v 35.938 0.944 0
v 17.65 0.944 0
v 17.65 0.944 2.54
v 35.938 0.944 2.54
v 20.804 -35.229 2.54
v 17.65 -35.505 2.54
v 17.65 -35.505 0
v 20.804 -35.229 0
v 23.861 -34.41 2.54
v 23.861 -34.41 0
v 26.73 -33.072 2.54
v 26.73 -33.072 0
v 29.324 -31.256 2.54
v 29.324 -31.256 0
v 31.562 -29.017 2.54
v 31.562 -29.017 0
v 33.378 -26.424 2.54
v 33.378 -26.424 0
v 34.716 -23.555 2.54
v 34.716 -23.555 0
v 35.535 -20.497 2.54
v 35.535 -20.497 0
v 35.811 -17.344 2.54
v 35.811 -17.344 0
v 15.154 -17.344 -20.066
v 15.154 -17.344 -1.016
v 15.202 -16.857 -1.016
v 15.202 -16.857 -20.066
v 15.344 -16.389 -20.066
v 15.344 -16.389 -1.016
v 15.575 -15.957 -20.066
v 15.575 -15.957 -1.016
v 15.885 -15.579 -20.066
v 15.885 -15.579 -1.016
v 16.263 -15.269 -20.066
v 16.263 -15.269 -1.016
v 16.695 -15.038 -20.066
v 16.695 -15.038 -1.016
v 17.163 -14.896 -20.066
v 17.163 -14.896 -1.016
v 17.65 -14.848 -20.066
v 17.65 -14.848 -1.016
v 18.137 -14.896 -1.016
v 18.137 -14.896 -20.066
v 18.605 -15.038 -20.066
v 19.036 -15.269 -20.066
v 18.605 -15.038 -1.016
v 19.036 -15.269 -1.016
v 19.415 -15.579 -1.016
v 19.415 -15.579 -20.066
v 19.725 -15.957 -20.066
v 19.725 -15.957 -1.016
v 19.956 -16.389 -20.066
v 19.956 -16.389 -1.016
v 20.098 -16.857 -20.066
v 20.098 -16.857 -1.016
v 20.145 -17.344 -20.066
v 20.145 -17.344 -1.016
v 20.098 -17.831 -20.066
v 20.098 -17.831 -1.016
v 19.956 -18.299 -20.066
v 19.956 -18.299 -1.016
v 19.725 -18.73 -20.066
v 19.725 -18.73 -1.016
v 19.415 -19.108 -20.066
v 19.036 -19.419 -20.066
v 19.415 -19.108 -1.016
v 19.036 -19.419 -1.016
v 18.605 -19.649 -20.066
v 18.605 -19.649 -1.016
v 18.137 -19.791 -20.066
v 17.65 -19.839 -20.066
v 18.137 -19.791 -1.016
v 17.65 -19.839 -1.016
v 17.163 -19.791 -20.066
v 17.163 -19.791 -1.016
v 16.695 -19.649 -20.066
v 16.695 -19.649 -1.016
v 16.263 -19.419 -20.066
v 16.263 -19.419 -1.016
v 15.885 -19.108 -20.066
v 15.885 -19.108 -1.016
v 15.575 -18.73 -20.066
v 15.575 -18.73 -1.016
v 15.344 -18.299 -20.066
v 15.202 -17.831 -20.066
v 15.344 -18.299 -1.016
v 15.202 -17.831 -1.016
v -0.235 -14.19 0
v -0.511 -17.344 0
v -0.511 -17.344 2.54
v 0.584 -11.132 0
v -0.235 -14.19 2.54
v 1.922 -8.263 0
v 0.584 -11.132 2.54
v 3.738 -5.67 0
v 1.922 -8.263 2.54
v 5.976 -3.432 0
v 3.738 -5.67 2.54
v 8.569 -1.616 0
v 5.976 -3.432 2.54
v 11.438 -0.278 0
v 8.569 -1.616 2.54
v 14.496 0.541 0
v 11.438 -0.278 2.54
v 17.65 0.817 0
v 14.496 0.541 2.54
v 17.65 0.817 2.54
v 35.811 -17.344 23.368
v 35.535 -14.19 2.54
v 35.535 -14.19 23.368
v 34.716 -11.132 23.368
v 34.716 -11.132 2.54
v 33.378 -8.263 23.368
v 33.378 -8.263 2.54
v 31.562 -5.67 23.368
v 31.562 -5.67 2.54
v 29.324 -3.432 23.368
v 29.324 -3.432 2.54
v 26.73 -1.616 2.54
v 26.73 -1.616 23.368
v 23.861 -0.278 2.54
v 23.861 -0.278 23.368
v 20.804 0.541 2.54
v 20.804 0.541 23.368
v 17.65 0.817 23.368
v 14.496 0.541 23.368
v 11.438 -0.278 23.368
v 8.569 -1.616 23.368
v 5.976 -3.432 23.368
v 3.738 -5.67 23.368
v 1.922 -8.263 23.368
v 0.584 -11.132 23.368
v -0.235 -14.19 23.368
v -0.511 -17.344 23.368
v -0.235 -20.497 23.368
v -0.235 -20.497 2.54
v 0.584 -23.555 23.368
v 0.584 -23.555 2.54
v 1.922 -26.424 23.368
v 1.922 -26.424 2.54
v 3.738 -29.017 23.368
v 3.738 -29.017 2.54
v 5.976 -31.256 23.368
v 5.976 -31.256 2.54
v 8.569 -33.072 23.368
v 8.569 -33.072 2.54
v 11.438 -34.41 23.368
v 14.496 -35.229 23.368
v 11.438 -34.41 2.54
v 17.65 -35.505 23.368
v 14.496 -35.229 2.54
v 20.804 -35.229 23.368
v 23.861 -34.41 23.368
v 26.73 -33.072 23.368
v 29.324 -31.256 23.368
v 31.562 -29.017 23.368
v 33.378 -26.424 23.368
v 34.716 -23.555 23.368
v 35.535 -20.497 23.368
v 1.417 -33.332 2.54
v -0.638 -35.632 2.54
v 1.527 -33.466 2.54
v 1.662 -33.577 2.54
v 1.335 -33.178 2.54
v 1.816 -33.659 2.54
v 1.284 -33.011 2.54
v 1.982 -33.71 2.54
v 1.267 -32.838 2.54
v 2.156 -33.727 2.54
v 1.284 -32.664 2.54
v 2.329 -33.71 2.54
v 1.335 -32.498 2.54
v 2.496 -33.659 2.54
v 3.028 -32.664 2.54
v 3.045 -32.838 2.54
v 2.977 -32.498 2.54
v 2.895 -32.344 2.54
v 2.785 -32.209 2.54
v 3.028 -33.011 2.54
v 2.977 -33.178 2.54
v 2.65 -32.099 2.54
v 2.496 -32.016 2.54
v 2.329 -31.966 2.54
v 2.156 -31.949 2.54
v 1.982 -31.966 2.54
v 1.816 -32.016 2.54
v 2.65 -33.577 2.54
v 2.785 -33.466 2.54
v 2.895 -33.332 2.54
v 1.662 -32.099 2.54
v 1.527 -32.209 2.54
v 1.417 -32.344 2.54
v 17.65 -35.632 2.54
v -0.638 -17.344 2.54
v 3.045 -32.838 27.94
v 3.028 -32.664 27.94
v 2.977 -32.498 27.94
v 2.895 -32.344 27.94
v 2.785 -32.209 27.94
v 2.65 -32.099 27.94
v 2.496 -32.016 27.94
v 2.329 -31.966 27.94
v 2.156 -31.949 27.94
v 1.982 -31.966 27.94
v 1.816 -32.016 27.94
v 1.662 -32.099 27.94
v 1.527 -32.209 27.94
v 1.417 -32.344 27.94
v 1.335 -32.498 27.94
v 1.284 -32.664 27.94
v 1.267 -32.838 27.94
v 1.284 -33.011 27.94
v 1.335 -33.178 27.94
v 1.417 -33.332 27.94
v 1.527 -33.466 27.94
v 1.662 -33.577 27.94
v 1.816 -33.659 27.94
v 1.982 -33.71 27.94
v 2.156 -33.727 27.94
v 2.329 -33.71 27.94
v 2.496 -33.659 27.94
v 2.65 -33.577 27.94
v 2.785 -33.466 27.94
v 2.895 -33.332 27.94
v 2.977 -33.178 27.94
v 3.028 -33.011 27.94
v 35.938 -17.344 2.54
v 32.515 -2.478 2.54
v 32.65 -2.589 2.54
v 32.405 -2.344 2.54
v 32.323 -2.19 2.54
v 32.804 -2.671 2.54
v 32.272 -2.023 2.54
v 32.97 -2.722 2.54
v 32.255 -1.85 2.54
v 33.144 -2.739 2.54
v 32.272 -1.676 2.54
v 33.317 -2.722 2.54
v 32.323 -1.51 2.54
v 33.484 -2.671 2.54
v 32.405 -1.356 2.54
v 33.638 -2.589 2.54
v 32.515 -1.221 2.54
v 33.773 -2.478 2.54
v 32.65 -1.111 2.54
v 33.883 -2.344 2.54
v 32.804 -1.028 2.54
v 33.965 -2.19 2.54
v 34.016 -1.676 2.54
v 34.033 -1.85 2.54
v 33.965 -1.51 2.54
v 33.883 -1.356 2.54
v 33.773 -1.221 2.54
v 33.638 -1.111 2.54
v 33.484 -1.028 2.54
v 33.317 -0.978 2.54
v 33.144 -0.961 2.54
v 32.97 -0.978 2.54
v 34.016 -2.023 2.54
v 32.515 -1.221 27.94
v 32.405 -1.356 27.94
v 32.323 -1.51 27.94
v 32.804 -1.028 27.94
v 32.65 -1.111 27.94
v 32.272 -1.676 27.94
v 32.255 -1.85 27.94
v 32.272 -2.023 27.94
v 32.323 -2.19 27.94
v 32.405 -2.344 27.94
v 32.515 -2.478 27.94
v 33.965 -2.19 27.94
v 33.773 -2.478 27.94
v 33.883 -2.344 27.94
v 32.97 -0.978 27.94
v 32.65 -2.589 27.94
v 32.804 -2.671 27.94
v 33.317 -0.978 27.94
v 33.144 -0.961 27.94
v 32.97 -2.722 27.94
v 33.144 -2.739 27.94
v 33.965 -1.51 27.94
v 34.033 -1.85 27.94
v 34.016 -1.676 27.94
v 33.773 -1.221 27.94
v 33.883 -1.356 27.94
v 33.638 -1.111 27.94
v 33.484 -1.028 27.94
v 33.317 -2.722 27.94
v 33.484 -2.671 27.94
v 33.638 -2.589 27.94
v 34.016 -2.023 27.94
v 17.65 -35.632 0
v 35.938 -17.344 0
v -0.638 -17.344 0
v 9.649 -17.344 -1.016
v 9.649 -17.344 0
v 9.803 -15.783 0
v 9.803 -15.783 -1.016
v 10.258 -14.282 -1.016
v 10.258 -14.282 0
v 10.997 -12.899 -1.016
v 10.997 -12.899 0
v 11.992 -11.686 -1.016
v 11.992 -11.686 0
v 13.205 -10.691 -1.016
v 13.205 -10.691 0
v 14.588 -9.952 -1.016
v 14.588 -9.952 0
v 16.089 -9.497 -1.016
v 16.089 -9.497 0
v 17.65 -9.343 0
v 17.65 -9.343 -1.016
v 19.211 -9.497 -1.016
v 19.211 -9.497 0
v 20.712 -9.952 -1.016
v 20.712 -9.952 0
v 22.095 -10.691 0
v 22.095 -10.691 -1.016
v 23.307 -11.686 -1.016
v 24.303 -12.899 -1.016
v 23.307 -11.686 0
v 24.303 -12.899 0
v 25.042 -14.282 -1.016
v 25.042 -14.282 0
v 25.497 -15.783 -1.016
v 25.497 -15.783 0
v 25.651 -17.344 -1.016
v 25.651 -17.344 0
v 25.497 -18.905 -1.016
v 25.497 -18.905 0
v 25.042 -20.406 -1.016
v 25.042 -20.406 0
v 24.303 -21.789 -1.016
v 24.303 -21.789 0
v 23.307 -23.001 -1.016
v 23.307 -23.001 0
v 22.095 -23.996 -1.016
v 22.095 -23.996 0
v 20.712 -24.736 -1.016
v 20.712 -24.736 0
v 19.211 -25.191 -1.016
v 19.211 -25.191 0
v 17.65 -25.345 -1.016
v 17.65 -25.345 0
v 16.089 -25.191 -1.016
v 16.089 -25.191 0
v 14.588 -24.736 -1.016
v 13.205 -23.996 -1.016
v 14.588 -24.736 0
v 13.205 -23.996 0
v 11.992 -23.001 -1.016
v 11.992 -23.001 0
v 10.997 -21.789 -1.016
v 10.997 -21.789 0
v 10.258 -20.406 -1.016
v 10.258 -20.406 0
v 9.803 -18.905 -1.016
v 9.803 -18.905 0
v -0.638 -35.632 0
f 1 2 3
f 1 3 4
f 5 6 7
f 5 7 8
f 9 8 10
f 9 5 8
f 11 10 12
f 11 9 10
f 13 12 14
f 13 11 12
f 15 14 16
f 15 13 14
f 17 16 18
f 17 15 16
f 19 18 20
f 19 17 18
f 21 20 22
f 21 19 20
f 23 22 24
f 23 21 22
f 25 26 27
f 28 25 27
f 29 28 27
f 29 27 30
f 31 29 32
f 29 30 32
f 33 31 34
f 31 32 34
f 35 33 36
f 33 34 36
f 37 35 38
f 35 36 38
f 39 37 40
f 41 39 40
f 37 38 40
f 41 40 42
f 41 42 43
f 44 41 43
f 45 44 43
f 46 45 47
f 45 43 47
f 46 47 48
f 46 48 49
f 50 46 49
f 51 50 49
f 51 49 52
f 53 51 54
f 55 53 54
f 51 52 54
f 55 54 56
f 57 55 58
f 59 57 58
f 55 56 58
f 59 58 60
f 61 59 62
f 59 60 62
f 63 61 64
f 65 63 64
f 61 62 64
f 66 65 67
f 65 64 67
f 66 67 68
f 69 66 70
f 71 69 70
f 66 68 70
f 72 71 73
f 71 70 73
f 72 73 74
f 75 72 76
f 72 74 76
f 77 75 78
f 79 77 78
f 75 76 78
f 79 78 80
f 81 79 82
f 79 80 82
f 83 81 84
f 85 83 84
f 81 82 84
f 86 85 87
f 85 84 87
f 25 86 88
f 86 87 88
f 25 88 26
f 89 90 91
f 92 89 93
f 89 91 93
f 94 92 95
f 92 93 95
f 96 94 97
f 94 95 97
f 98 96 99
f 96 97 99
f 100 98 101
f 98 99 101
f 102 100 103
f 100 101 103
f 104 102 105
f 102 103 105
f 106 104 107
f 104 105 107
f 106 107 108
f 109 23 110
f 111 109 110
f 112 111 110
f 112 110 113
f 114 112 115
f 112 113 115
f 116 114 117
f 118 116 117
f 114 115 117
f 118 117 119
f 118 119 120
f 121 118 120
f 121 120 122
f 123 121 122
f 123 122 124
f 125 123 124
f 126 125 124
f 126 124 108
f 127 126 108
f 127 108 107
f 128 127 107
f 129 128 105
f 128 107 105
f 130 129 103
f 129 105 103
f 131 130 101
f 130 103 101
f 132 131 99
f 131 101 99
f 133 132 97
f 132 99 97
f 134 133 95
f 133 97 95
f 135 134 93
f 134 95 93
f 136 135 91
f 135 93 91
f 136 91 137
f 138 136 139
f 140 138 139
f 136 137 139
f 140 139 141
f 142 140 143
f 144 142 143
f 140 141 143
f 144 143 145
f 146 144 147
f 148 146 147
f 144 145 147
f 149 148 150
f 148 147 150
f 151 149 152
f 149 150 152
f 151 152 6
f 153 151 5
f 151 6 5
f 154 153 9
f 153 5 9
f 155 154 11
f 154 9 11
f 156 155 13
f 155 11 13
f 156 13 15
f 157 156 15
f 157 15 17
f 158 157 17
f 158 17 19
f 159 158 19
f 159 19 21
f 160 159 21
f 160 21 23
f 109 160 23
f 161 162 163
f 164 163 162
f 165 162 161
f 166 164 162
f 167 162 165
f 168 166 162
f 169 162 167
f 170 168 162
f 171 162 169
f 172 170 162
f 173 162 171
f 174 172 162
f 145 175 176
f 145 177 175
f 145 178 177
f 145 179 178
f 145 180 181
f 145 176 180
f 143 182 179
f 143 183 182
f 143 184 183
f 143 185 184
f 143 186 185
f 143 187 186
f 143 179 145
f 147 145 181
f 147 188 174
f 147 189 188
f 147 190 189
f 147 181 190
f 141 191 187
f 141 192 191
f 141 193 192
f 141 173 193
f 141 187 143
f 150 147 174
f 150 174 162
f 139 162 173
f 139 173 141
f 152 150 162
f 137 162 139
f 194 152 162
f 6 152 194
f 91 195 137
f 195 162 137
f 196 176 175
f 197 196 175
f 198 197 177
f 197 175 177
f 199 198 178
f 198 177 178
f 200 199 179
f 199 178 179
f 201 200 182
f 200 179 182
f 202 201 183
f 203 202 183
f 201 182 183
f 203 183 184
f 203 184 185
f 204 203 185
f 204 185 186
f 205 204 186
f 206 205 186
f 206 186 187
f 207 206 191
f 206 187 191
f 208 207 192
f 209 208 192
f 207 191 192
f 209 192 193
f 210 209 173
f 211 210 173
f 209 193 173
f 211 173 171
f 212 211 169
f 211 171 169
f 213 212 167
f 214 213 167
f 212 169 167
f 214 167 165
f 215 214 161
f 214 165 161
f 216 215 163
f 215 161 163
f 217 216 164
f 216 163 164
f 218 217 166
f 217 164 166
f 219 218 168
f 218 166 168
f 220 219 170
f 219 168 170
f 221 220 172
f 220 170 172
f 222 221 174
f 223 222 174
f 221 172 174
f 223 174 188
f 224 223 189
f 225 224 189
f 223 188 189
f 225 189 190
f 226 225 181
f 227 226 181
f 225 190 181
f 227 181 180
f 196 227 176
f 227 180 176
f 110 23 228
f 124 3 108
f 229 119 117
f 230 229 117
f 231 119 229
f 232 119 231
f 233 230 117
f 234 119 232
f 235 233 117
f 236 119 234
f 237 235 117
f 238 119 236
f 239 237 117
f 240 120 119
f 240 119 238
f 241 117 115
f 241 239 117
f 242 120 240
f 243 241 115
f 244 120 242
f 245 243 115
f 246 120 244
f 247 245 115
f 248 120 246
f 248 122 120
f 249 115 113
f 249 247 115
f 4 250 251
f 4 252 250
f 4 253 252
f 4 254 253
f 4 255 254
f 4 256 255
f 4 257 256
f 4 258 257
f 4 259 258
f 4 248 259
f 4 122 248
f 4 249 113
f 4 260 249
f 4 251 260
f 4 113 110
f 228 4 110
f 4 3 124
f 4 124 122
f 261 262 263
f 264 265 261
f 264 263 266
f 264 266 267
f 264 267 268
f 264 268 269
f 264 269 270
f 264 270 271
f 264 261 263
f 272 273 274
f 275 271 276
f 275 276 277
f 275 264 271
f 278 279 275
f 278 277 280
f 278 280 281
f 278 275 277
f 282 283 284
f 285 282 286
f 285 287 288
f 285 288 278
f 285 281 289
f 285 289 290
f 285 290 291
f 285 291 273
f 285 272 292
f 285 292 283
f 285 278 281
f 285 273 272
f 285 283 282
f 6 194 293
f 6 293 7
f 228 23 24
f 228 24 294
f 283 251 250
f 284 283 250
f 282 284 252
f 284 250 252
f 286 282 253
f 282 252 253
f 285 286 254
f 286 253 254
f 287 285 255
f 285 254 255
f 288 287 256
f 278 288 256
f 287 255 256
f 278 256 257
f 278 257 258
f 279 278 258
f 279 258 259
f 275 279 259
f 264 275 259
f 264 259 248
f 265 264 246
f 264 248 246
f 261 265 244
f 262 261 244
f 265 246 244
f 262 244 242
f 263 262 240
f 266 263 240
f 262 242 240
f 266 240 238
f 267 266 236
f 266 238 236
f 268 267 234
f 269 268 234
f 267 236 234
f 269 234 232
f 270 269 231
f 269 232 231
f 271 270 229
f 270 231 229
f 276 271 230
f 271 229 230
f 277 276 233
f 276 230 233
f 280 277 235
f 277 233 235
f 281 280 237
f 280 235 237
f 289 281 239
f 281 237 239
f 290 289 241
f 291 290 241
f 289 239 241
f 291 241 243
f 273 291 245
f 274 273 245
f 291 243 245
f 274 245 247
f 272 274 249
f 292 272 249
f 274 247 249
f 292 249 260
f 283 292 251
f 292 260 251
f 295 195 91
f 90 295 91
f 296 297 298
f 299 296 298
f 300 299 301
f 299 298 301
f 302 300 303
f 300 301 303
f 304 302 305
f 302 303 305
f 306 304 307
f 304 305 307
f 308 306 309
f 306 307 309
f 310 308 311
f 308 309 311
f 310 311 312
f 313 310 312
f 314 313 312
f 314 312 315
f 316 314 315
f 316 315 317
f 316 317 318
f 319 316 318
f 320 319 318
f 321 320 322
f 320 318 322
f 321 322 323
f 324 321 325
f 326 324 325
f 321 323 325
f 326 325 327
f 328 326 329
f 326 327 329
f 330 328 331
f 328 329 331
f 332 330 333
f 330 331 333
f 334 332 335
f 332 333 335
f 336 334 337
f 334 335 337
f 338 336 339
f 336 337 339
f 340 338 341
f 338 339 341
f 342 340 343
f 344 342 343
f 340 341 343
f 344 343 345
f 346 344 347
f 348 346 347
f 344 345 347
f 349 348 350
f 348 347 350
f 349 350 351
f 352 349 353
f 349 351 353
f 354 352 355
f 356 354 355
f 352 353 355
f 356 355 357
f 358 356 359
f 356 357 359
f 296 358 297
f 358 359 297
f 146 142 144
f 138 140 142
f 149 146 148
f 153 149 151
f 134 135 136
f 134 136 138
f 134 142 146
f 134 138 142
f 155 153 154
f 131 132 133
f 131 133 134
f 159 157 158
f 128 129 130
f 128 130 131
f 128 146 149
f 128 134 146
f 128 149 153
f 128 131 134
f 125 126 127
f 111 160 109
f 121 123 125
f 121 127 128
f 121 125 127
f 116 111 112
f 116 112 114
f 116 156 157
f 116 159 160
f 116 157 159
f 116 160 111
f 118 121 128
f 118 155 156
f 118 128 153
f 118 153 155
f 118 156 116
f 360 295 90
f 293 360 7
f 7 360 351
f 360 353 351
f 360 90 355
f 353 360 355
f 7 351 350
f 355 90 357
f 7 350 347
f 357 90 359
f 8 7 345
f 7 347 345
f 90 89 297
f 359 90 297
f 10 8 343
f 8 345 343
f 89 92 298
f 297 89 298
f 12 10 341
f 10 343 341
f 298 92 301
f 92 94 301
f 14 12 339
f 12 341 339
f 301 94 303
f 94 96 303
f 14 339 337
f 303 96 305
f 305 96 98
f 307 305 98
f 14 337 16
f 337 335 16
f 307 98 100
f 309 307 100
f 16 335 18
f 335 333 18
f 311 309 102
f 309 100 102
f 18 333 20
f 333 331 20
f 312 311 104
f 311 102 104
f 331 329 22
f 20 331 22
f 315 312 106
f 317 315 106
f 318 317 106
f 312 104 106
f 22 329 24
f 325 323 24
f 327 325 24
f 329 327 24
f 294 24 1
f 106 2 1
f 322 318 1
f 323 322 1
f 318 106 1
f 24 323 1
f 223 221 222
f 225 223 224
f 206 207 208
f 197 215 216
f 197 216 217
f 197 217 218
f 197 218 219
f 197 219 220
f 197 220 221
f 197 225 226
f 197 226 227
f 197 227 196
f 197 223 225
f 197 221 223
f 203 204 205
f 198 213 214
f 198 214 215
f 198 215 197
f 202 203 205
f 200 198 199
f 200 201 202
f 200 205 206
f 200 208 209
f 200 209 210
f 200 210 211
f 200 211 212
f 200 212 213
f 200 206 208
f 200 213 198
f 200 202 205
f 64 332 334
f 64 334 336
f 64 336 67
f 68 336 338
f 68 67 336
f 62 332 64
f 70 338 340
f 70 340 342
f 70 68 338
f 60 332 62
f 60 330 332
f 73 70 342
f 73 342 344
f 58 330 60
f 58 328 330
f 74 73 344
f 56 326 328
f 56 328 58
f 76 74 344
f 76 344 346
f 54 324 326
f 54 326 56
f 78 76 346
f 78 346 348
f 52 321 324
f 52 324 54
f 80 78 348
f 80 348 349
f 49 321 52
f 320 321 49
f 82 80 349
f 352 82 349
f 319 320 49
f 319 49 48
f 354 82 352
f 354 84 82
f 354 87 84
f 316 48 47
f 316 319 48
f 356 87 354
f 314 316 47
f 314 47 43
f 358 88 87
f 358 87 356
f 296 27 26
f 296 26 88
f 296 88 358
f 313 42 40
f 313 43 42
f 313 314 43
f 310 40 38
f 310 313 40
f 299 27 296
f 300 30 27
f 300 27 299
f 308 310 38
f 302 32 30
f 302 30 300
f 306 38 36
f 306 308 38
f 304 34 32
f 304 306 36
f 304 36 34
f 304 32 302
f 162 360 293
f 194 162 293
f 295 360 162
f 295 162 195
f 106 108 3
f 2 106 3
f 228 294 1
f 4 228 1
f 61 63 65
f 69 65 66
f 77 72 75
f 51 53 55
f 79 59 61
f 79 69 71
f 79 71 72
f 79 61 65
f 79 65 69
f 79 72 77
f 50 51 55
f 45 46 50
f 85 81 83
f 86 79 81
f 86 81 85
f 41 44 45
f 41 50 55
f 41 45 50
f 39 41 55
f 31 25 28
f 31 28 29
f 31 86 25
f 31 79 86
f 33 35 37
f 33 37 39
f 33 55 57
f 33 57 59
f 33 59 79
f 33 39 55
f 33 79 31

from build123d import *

# Parameters (mm, degrees)
SKETCH1_W           = 36.576
SKETCH1_H           = 36.576
BOSS_EXTRUDE1_DEPTH = 2.54
SKETCH2_R           = 0.889
BOSS_EXTRUDE2_DEPTH = 25.4
CUT_EXTRUDE4_DEPTH  = 3.54
SKETCH4_R           = 8.001
BOSS_EXTRUDE3_DEPTH = 1.016
SKETCH5_R           = 2.49555
BOSS_EXTRUDE4_DEPTH = 19.05
SKETCH6_R           = 18.161
BOSS_EXTRUDE5_DEPTH = 20.828


with BuildPart() as part:
    # Sketch1 → Boss-Extrude1 (new body)
    with BuildSketch(Plane.XY):
        with Locations((17.649916168, -17.343808383)):
            Rectangle(SKETCH1_W, SKETCH1_H)
    extrude(amount=BOSS_EXTRUDE1_DEPTH)

    # Sketch2 → Boss-Extrude2 (add)
    with BuildSketch(Plane.XY.offset(2.54)):
        with Locations((33.143916168, -1.849808383)):
            Circle(SKETCH2_R)
        with Locations((2.155916168, -32.837808383)):
            Circle(SKETCH2_R)
    extrude(amount=BOSS_EXTRUDE2_DEPTH)

    # Sketch3 → Cut-Extrude4 (cut, through all)
    with BuildSketch(Plane.XY.offset(2.54)):
        with BuildLine():
            Line((-0.638083832, 0.944191617), (-0.638083832, -17.343808383))
            Line((-0.638083832, -17.343808383), (-0.511083832, -17.343808383))
            ThreePointArc((-0.511083832, -17.343808383), (4.808149915, -4.50204213), (17.649916168, 0.817191617))
            Line((17.649916168, 0.817191617), (17.649916168, 0.944191617))
            Line((17.649916168, 0.944191617), (-0.638083832, 0.944191617))
        make_face()
        with BuildLine():
            Line((35.937916168, -35.631808383), (17.649916168, -35.631808383))
            Line((17.649916168, -35.631808383), (17.649916168, -35.504808383))
            ThreePointArc((17.649916168, -35.504808383), (30.491682421, -30.185574636), (35.810916168, -17.343808383))
            Line((35.810916168, -17.343808383), (35.937916168, -17.343808383))
            Line((35.937916168, -17.343808383), (35.937916168, -35.631808383))
        make_face()
    extrude(amount=-CUT_EXTRUDE4_DEPTH, mode=Mode.SUBTRACT)

    # Sketch4 → Boss-Extrude3 (add)
    with BuildSketch(Plane(origin=(0, 0, 0), x_dir=(-1, 0, 0), z_dir=(0, 0, -1))):
        with Locations((-17.649916168, -17.343808383)):
            Circle(SKETCH4_R)
    extrude(amount=BOSS_EXTRUDE3_DEPTH)

    # Sketch5 → Boss-Extrude4 (add)
    with BuildSketch(Plane(origin=(0, 0, -1.016), x_dir=(-1, 0, 0), z_dir=(0, 0, -1))):
        with Locations((-17.649916168, -17.343808383)):
            Circle(SKETCH5_R)
    extrude(amount=BOSS_EXTRUDE4_DEPTH)

    # Sketch6 → Boss-Extrude5 (add)
    with BuildSketch(Plane.XY.offset(2.54)):
        with Locations((17.649916168, -17.343808383)):
            Circle(SKETCH6_R)
    extrude(amount=BOSS_EXTRUDE5_DEPTH)


solid = part.part
